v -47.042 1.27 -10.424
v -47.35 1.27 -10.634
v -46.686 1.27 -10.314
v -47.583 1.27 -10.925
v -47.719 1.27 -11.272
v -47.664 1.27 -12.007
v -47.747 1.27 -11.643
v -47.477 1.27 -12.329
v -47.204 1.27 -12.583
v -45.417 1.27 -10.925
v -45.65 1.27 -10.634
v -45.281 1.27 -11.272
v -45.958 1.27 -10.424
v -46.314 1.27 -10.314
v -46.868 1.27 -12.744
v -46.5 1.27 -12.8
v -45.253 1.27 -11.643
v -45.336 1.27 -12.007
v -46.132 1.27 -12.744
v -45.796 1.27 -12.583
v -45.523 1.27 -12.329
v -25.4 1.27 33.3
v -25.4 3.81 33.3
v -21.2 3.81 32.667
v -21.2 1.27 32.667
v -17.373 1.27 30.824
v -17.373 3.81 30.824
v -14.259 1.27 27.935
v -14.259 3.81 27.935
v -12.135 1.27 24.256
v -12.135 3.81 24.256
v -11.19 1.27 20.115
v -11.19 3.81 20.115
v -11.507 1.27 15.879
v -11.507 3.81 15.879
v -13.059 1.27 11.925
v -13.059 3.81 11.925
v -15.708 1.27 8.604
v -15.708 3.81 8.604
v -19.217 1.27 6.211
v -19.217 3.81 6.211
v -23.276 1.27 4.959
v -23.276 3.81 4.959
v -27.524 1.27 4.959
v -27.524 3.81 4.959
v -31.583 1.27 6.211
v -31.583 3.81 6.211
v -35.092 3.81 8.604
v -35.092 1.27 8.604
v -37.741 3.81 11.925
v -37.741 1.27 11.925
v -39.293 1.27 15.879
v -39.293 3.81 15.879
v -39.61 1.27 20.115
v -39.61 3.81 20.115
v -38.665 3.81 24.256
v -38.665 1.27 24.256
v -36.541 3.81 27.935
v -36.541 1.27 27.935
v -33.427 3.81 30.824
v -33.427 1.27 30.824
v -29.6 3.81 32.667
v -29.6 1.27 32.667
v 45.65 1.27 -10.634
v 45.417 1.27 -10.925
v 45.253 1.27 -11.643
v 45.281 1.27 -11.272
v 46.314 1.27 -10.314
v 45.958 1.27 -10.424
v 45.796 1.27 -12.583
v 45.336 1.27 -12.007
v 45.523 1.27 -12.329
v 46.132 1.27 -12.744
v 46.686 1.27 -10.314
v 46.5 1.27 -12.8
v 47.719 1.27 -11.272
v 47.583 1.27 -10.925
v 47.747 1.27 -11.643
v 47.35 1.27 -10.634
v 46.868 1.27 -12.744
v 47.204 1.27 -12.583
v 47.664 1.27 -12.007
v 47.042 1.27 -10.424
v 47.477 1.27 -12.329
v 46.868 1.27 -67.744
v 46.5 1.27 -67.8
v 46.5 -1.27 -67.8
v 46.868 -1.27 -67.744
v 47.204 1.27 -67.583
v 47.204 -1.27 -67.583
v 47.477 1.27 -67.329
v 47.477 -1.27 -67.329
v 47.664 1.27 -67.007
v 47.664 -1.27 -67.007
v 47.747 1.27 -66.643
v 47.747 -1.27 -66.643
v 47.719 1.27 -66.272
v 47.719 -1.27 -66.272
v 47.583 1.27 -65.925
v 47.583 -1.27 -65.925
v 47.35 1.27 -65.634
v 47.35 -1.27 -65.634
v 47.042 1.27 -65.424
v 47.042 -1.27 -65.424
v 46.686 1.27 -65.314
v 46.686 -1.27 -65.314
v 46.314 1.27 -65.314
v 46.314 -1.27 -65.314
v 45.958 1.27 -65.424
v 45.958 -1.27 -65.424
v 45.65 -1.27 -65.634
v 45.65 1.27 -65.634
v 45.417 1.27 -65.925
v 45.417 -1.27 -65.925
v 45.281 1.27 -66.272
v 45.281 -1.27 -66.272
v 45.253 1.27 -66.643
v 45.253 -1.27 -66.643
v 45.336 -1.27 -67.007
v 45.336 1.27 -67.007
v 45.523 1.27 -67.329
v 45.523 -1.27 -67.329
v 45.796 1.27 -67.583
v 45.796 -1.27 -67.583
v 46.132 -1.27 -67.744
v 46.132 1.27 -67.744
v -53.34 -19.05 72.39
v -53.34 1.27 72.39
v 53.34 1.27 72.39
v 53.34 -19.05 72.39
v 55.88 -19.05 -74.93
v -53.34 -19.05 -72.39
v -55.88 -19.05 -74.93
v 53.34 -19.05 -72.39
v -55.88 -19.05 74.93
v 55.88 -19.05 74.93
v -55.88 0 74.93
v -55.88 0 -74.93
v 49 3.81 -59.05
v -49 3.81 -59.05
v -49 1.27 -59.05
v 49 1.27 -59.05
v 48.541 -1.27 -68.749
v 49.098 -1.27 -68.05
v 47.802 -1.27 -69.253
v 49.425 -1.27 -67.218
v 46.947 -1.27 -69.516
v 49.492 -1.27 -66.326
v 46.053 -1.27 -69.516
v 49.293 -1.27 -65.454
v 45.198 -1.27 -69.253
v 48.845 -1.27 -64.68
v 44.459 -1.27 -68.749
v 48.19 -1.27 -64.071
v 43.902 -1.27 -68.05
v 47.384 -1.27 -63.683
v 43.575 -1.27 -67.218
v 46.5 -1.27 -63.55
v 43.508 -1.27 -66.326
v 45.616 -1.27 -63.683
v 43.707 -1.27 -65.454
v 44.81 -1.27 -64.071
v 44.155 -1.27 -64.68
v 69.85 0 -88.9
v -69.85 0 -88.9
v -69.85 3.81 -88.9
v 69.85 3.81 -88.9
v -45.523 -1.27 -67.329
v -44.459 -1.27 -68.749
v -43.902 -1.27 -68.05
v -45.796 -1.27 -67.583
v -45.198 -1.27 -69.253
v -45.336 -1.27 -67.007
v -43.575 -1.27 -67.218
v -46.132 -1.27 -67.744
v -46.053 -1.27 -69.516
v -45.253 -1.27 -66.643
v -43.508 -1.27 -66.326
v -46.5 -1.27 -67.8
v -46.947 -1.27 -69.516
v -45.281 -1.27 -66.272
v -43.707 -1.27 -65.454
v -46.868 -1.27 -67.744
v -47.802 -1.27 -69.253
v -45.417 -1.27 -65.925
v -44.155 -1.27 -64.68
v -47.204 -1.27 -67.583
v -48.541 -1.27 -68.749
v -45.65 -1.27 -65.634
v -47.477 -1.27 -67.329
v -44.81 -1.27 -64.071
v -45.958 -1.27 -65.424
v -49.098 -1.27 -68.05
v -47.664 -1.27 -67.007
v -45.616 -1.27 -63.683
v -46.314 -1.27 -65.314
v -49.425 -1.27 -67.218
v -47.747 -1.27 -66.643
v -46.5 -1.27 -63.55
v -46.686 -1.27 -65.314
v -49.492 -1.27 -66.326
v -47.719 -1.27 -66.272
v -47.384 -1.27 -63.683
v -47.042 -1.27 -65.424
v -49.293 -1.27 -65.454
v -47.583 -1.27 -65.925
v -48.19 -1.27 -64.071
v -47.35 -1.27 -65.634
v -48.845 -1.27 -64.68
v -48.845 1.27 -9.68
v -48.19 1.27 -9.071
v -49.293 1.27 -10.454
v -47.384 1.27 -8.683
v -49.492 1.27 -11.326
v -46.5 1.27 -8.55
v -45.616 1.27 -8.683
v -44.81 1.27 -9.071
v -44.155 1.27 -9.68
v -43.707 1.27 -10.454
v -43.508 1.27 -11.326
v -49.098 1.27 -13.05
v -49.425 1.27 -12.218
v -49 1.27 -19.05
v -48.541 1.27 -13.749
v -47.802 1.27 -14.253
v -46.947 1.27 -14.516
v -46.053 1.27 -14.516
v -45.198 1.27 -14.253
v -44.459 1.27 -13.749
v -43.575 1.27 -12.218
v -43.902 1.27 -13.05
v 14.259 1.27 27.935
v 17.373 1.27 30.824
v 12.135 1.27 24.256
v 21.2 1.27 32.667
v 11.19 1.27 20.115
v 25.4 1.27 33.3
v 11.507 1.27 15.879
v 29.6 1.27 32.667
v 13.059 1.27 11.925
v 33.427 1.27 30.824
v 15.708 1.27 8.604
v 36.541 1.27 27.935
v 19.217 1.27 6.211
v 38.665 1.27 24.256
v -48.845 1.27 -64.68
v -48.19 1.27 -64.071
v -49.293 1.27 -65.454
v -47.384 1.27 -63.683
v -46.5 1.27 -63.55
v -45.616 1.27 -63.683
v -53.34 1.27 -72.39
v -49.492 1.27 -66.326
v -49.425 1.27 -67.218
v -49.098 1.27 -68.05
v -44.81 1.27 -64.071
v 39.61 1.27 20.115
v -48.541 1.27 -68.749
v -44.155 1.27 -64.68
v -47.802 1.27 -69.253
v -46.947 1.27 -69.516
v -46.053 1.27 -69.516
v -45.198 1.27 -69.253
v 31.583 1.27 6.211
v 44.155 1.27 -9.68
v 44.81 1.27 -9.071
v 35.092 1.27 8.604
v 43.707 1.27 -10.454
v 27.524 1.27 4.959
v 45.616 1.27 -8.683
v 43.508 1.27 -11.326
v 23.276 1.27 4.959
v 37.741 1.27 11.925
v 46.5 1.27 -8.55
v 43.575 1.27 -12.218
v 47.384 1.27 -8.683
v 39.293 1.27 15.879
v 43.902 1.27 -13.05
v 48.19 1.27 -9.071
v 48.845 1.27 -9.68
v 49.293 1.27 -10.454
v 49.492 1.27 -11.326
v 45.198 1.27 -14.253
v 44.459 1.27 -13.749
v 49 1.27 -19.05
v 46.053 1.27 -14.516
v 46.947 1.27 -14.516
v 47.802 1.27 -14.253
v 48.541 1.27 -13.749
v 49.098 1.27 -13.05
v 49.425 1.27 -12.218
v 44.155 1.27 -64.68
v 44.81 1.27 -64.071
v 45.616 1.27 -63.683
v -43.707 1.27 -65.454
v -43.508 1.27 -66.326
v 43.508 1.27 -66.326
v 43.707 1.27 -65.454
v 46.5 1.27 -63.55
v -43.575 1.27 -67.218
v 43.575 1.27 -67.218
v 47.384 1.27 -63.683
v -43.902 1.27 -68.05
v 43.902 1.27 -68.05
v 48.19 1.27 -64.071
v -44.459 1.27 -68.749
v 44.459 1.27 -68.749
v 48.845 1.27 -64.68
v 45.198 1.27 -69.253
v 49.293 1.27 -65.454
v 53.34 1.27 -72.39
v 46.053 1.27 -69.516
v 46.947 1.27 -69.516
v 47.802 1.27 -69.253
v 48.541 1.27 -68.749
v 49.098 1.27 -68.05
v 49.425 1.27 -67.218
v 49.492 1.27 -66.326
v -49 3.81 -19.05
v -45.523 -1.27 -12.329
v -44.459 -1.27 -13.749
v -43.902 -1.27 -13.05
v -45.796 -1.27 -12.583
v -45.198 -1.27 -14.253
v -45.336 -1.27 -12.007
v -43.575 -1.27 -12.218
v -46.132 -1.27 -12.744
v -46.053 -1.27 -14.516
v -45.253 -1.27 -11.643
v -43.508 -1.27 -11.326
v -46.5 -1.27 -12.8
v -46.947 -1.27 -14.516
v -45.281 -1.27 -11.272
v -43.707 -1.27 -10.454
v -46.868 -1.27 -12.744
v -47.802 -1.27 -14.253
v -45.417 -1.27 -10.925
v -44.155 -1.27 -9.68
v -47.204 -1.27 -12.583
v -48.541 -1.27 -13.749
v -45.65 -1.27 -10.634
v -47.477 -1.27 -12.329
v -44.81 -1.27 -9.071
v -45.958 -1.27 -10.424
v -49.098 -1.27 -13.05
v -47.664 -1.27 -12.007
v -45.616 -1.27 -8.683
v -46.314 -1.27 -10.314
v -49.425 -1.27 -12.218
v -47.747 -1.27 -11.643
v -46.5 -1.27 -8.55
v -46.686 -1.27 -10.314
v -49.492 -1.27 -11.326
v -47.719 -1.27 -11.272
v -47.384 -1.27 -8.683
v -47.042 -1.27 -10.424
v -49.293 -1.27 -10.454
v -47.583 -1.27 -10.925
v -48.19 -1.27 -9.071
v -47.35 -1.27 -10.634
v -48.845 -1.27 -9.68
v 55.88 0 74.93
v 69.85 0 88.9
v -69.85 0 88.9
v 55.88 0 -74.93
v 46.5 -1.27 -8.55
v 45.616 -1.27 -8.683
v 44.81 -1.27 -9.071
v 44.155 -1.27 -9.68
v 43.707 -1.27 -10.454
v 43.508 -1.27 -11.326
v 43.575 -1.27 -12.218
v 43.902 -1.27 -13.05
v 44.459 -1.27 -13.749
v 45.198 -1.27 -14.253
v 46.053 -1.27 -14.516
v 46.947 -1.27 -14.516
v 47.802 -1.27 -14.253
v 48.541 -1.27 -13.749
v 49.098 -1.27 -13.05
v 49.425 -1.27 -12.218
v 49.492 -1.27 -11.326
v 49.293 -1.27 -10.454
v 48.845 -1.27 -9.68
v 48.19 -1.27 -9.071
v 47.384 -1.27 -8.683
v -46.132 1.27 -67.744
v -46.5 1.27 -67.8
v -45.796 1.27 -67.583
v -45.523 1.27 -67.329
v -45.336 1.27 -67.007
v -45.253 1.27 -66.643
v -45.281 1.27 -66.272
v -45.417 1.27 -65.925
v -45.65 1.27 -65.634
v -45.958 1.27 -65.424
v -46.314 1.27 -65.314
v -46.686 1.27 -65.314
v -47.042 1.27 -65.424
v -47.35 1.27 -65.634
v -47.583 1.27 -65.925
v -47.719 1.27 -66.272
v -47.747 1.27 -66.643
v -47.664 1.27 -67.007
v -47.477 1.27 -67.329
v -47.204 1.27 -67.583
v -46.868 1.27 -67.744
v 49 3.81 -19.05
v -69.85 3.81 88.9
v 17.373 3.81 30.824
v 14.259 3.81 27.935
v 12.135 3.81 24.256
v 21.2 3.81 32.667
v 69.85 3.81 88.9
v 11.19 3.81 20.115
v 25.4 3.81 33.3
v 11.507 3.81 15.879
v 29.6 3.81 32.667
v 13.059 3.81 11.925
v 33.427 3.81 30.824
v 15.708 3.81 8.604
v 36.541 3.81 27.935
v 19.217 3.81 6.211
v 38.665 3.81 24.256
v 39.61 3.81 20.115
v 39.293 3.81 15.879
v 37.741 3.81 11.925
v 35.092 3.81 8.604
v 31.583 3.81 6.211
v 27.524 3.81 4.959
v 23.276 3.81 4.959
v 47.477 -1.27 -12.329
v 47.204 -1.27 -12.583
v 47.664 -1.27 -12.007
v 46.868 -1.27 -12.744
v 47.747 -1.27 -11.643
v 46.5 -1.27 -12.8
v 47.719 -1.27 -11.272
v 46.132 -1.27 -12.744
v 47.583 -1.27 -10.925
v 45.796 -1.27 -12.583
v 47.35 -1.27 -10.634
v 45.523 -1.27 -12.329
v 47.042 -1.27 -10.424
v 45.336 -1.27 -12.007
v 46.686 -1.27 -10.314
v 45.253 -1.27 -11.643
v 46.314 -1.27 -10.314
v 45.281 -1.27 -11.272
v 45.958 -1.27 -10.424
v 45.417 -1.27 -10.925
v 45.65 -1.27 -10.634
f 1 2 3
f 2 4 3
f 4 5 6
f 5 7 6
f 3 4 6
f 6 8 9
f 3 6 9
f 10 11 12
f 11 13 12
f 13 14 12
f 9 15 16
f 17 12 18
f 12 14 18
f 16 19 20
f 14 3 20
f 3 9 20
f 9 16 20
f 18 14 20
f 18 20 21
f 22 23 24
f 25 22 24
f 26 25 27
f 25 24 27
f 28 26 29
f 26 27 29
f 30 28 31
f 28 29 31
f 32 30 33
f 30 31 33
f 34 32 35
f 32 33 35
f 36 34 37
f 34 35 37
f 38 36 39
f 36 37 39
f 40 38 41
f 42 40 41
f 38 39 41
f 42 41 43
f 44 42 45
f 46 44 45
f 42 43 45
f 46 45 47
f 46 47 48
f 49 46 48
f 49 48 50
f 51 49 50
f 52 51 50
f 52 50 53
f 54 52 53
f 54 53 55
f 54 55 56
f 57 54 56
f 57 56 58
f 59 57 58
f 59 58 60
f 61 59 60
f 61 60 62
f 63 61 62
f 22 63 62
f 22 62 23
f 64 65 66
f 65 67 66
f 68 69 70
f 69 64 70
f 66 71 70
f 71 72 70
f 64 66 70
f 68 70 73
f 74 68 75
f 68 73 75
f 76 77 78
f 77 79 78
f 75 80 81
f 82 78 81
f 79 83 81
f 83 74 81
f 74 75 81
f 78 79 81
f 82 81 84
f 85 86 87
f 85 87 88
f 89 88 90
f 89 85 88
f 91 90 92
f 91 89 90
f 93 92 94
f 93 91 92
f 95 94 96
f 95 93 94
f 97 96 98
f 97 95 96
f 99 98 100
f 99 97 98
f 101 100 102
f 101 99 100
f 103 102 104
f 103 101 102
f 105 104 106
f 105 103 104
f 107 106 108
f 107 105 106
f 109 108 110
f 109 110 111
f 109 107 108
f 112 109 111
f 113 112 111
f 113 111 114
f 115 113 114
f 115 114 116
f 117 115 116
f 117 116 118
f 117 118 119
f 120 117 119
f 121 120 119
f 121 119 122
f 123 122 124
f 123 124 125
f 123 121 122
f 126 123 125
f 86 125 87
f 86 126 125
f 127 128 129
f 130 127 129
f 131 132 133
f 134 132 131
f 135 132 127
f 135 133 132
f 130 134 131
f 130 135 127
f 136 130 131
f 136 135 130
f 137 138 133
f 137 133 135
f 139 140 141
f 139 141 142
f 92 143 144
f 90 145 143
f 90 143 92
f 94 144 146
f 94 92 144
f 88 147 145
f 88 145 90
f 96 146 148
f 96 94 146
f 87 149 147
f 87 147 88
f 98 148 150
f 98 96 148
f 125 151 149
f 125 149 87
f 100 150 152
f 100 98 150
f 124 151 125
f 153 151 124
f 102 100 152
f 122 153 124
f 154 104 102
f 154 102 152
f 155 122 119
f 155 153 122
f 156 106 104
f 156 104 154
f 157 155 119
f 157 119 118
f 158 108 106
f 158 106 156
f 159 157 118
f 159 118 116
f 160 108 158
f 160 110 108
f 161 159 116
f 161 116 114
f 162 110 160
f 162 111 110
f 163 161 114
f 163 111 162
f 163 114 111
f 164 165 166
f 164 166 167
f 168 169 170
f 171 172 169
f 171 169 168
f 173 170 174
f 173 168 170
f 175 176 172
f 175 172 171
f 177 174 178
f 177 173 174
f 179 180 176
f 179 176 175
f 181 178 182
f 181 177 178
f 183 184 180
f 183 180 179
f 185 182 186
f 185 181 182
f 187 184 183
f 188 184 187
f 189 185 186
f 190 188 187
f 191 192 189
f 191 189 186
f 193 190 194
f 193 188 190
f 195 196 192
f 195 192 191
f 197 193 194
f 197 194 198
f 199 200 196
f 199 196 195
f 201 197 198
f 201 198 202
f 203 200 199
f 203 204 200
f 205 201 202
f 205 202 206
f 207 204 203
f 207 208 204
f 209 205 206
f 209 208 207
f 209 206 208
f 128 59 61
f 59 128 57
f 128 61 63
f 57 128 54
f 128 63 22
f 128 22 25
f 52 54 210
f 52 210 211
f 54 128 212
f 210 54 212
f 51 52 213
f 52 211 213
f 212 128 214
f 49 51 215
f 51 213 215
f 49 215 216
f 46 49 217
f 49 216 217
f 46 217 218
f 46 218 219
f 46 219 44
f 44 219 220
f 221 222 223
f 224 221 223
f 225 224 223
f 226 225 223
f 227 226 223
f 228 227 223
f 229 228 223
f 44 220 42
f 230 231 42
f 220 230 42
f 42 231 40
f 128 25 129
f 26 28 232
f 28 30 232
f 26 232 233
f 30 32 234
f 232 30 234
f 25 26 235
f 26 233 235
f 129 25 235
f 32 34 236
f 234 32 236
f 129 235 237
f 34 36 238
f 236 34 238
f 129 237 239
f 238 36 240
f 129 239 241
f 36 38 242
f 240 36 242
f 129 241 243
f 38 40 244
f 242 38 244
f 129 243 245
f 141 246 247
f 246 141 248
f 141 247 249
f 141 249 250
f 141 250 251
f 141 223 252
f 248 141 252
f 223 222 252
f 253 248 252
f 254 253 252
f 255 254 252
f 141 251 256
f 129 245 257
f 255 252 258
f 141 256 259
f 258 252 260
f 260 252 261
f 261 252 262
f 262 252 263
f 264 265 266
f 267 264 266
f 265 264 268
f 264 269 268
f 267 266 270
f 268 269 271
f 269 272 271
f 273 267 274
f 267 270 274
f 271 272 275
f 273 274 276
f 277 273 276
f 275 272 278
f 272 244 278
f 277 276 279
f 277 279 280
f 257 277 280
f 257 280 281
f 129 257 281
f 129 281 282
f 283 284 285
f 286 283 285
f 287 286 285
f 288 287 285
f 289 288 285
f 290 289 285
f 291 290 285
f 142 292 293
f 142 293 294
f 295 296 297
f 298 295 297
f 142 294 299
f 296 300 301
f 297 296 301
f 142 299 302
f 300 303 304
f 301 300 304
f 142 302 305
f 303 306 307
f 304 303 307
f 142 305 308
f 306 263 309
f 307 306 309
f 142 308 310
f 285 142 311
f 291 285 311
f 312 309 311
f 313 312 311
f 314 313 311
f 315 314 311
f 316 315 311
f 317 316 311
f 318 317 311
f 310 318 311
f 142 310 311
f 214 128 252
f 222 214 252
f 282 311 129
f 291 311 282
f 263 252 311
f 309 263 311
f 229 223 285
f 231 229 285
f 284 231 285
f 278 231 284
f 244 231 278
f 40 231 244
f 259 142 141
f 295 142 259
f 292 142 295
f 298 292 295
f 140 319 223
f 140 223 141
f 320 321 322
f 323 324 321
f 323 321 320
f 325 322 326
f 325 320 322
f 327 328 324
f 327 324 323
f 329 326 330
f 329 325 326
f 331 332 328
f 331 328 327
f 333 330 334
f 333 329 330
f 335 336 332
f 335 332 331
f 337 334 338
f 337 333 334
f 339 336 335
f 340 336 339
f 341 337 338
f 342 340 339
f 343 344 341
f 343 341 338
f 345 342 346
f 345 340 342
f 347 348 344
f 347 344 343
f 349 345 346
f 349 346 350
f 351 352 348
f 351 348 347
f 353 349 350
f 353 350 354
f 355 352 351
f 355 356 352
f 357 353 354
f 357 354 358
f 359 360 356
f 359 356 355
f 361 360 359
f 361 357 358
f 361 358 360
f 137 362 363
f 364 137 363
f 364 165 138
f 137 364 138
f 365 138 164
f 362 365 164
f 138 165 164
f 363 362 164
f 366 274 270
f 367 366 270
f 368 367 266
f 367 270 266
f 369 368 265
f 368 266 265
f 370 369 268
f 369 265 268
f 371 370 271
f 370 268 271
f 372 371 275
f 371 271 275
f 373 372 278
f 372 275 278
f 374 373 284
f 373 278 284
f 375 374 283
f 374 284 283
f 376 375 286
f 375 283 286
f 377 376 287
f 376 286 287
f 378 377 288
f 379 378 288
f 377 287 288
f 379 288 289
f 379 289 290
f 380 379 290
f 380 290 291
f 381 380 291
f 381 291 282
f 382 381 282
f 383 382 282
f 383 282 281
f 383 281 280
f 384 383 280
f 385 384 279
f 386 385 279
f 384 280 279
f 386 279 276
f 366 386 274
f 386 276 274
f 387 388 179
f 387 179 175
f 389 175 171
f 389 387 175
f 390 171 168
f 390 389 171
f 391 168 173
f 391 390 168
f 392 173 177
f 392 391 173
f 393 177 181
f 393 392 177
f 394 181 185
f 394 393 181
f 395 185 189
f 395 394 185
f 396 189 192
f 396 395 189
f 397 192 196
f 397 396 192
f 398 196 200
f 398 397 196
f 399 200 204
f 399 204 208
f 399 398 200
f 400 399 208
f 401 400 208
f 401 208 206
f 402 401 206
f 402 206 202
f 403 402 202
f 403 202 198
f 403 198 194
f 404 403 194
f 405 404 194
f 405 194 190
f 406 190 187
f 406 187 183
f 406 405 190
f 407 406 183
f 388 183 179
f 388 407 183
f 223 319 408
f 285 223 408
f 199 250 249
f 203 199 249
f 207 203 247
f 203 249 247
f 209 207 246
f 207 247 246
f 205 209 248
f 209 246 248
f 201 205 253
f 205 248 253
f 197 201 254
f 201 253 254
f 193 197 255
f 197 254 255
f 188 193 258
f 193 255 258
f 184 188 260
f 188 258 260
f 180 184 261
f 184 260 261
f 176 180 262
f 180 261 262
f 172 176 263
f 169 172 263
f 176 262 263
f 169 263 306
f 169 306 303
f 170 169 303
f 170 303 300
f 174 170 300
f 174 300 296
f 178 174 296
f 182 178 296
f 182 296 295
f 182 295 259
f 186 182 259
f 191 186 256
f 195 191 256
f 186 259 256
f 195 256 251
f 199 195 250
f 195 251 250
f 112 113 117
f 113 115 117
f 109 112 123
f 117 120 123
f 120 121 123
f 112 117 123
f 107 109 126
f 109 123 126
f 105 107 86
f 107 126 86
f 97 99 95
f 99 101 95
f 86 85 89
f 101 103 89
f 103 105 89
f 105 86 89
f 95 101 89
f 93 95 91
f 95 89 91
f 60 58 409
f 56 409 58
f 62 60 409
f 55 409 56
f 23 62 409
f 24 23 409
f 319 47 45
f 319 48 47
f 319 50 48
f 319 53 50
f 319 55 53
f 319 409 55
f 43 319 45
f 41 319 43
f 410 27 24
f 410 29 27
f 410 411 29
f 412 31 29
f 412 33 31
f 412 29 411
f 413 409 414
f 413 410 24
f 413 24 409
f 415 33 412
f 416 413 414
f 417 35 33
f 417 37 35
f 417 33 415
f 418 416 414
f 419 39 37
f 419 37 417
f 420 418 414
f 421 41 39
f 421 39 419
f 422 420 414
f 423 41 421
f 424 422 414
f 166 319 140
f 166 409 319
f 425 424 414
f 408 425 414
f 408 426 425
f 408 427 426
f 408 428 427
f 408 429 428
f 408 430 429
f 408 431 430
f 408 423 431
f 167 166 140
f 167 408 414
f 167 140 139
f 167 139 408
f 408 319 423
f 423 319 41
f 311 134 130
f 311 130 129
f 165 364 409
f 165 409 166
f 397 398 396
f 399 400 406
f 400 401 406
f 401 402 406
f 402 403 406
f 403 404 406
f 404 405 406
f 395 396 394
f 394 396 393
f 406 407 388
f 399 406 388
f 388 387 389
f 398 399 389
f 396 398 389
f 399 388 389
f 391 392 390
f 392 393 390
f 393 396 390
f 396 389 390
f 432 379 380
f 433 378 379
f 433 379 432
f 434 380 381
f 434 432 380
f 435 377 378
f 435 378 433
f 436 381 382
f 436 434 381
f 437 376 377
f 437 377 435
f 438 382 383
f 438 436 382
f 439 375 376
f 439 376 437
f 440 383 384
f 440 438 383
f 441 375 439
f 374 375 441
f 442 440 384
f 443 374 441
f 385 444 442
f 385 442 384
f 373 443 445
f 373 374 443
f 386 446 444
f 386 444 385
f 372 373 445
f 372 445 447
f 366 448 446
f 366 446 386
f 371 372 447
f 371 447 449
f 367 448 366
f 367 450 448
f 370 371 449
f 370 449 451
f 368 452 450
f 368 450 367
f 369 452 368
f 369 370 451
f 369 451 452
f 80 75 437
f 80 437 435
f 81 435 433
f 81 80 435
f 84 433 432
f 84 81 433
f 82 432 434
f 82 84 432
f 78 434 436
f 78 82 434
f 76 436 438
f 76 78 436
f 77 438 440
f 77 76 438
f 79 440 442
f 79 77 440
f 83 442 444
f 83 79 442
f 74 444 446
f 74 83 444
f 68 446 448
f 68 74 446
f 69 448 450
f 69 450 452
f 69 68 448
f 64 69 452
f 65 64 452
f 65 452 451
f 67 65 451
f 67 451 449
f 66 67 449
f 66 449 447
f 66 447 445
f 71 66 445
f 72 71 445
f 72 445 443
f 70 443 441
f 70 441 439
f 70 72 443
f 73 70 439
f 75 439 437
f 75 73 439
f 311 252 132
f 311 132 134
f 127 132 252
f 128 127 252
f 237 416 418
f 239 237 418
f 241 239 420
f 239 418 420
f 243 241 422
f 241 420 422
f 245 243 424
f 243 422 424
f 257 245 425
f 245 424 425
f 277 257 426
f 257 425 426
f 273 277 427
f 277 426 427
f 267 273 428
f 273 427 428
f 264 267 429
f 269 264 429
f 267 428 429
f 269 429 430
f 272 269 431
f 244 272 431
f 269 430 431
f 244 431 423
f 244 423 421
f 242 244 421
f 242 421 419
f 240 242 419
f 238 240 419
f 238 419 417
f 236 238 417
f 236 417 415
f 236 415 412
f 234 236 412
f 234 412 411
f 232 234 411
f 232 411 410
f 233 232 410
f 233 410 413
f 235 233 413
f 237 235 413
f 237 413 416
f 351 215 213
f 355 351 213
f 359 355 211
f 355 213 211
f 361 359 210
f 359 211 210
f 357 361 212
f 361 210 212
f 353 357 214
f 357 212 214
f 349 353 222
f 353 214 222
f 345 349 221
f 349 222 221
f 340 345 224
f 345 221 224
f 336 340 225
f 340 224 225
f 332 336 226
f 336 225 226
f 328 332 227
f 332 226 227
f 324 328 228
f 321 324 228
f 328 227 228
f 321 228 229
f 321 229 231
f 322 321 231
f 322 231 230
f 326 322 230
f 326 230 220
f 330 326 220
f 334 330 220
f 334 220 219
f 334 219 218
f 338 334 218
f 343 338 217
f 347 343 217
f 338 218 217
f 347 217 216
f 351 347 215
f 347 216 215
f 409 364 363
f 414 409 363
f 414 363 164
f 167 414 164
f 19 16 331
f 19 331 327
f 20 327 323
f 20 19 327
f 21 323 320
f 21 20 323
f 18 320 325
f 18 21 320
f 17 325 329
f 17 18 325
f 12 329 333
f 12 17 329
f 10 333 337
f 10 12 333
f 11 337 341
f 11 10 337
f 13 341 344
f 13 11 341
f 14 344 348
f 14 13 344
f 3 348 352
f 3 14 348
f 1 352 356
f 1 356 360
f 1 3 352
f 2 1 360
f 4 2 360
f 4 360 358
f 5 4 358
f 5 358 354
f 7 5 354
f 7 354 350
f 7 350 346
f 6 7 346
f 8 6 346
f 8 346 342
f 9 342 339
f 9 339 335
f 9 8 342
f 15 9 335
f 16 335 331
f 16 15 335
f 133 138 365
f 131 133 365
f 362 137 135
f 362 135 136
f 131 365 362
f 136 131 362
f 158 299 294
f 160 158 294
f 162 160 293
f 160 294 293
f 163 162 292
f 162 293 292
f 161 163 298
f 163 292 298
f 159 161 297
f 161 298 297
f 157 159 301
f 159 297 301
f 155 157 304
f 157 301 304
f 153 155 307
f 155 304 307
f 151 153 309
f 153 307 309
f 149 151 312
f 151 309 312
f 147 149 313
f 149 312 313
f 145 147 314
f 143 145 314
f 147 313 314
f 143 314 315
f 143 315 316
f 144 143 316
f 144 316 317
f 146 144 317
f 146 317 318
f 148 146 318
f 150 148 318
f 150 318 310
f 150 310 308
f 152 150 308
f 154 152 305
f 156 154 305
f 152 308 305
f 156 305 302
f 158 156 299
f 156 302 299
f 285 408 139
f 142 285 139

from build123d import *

# Parameters (mm, degrees)
SKETCH1_W           = 139.7
SKETCH1_H           = 177.8
BOSS_EXTRUDE1_DEPTH = 3.81
SKETCH2_W           = 111.76
SKETCH2_H           = 149.86
BOSS_EXTRUDE2_DEPTH = 19.05
SHELL1_START        = -72.39
SHELL1_OUTLINE_W    = 106.68
SHELL1_OUTLINE_H    = 20.32
SHELL1_DEPTH        = 144.78
SKETCH3_R           = 14.25
SKETCH3_W           = 98
SKETCH3_H           = 40
CUT_EXTRUDE1_DEPTH  = 116.346487159
SKETCH4_R           = 3
SKETCH4_R_2         = 1.25
BOSS_EXTRUDE3_DEPTH = 2.54


# Read off the part's stored shape, not the designer's step: Shell1
with BuildPart() as part:
    # Sketch1 → Boss-Extrude1 (new body)
    with BuildSketch(Plane(origin=(0, 0, 0), x_dir=(1, 0, 0), z_dir=(0, 1, 0))):
        Rectangle(SKETCH1_W, SKETCH1_H)
    extrude(amount=BOSS_EXTRUDE1_DEPTH)

    # Sketch2 → Boss-Extrude2 (add)
    with BuildSketch(Plane.XZ):
        Rectangle(SKETCH2_W, SKETCH2_H)
    extrude(amount=BOSS_EXTRUDE2_DEPTH)

    # Shell1 outline → Shell1 (cut)
    with BuildSketch(Plane.XY.offset(SHELL1_START)):
        with Locations((0, -8.89)):
            Rectangle(SHELL1_OUTLINE_W, SHELL1_OUTLINE_H)
    extrude(amount=SHELL1_DEPTH, mode=Mode.SUBTRACT)

    # Sketch3 → Cut-Extrude1 (cut, through all)
    with BuildSketch(Plane(origin=(0, 3.81, 0), x_dir=(1, 0, 0), z_dir=(0, 1, 0))):
        with Locations(Location((-25.4, -19.05, 0), (0, 0, 270))):
            Circle(SKETCH3_R)
        with Locations(Location((25.4, -19.05, 0), (0, 0, 270))):
            Circle(SKETCH3_R)
        with Locations((0, 39.05)):
            Rectangle(SKETCH3_W, SKETCH3_H)
    extrude(amount=-CUT_EXTRUDE1_DEPTH, mode=Mode.SUBTRACT)

    # Sketch4 → Boss-Extrude3 (add)
    # profile 1 of 4: a face of its own
    with BuildSketch(Plane.XZ.offset(-1.27)):
        with Locations(Location((-46.5, -11.55, 0), (0, 0, 90))):
            Circle(SKETCH4_R)
        with Locations(Location((-46.5, -11.55, 0), (0, 0, 270))):
            Circle(SKETCH4_R_2, mode=Mode.SUBTRACT)
    # profile 2 of 4: a face of its own
    with BuildSketch(Plane.XZ.offset(-1.27)):
        with Locations(Location((46.5, -11.55, 0), (0, 0, 90))):
            Circle(SKETCH4_R)
        with Locations(Location((46.5, -11.55, 0), (0, 0, 270))):
            Circle(SKETCH4_R_2, mode=Mode.SUBTRACT)
    # profile 3 of 4: a face of its own
    with BuildSketch(Plane.XZ.offset(-1.27)):
        with Locations(Location((46.5, -66.55, 0), (0, 0, 90))):
            Circle(SKETCH4_R)
        with Locations(Location((46.5, -66.55, 0), (0, 0, 270))):
            Circle(SKETCH4_R_2, mode=Mode.SUBTRACT)
    # profile 4 of 4: a face of its own
    with BuildSketch(Plane.XZ.offset(-1.27)):
        with Locations(Location((-46.5, -66.55, 0), (0, 0, 90))):
            Circle(SKETCH4_R)
        with Locations(Location((-46.5, -66.55, 0), (0, 0, 270))):
            Circle(SKETCH4_R_2, mode=Mode.SUBTRACT)
    extrude(amount=BOSS_EXTRUDE3_DEPTH)


solid = part.part
